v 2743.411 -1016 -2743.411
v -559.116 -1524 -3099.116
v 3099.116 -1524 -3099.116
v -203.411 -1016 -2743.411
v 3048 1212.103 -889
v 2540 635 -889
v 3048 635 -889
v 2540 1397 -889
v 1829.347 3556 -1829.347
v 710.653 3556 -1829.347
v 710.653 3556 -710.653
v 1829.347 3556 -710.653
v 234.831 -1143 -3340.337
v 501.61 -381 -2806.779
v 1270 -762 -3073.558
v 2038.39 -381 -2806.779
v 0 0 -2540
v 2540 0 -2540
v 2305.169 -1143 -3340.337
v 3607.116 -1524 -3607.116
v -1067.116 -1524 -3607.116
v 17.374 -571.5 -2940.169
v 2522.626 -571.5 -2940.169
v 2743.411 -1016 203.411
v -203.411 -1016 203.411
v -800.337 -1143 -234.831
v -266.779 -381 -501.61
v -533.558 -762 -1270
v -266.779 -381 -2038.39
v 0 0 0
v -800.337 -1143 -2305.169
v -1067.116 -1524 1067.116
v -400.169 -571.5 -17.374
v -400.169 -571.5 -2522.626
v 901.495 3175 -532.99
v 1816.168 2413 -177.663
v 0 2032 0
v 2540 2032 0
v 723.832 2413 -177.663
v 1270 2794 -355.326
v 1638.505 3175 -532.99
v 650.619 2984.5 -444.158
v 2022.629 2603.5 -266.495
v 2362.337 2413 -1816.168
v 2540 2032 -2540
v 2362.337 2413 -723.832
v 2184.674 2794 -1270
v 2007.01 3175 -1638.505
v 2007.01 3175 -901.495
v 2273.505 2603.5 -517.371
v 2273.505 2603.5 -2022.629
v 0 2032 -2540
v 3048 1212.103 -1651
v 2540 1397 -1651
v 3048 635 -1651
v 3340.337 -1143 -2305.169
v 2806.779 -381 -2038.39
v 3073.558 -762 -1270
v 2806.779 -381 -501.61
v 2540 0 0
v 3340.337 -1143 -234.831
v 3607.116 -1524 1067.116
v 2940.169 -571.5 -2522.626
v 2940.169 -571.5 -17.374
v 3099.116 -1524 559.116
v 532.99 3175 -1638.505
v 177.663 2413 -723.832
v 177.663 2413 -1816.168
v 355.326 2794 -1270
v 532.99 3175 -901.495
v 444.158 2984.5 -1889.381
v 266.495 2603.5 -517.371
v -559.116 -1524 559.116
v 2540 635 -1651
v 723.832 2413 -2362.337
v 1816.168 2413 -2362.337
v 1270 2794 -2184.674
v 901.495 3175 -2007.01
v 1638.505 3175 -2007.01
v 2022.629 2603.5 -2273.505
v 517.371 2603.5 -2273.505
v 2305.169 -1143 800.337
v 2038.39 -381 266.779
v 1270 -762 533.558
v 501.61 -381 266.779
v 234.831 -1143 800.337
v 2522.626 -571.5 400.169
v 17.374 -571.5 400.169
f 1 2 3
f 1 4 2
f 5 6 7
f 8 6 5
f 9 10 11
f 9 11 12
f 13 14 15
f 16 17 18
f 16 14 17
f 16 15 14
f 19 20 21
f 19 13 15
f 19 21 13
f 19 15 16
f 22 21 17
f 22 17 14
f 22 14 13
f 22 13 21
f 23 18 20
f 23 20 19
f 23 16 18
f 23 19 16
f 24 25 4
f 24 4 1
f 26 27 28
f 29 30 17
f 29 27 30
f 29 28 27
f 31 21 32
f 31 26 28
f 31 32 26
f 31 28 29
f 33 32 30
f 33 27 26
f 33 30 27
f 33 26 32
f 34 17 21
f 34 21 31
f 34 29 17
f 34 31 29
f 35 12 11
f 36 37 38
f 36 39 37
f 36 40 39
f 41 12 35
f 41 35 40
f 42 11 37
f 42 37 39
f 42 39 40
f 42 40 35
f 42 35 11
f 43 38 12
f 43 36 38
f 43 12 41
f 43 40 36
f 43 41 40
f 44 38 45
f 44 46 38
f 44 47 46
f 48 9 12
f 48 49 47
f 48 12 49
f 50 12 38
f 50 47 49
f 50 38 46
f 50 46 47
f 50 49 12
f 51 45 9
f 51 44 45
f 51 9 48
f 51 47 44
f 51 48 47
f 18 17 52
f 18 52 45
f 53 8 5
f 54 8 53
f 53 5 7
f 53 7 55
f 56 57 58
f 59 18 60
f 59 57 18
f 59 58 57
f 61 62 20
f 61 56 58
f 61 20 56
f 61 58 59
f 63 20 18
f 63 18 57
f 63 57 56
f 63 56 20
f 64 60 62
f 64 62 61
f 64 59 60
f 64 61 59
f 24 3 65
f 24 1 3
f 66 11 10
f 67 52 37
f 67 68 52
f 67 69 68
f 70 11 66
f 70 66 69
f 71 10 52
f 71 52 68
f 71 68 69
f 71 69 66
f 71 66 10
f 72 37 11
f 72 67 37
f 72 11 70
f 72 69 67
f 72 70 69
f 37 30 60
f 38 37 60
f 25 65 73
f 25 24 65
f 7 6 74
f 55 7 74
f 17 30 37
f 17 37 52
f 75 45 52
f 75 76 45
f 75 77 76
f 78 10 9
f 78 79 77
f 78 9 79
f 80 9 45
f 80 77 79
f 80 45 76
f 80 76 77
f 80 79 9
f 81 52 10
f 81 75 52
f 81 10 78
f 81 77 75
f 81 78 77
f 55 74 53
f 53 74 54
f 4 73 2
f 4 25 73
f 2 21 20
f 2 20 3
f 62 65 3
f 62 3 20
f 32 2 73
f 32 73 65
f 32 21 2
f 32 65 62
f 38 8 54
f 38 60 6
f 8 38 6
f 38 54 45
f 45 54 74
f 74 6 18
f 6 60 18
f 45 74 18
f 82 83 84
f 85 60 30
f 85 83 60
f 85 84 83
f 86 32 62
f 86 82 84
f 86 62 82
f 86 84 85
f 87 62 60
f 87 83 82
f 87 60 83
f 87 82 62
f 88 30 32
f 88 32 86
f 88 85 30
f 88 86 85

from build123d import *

# Parameters (mm, degrees)
SKETCH1_W           = 2540
SKETCH1_H           = 2540
BOSS_EXTRUDE1_DEPTH = 2032
SKETCH3_W           = 2540
SKETCH3_H           = 2540
BOSS_EXTRUDE2_DEPTH = 1524
BOSS_EXTRUDE2_TAPER = 25
SKETCH6_W           = 2540
SKETCH6_H           = 2540
BOSS_EXTRUDE3_DEPTH = 1524
BOSS_EXTRUDE3_TAPER = -35
SKETCH7_W           = 3658.232576464
SKETCH7_H           = 3658.232576464
CUT_EXTRUDE1_DEPTH  = 508
CUT_EXTRUDE1_TAPER  = 35
SKETCH8_W           = 762
SKETCH8_H           = 762
BOSS_EXTRUDE4_DEPTH = 508
DRAFT1_ANGLE        = 20


with BuildPart() as part:
    # Sketch1 → Boss-Extrude1 (new body)
    with BuildSketch(Plane(origin=(0, 0, 0), x_dir=(1, 0, 0), z_dir=(0, 1, 0))):
        with Locations((1270, 1270)):
            Rectangle(SKETCH1_W, SKETCH1_H)
    extrude(amount=BOSS_EXTRUDE1_DEPTH)

    # Sketch3 → Boss-Extrude2 (add)
    with BuildSketch(Plane(origin=(0, 2032, 0), x_dir=(1, 0, 0), z_dir=(0, 1, 0))):
        with Locations((1270, 1270)):
            Rectangle(SKETCH3_W, SKETCH3_H)
    extrude(amount=BOSS_EXTRUDE2_DEPTH, taper=BOSS_EXTRUDE2_TAPER)

    # Sketch6 → Boss-Extrude3 (add)
    with BuildSketch(Plane.XZ):
        with Locations((1270, -1270)):
            Rectangle(SKETCH6_W, SKETCH6_H)
    extrude(amount=BOSS_EXTRUDE3_DEPTH, taper=BOSS_EXTRUDE3_TAPER)

    # Sketch7 → Cut-Extrude1 (cut)
    with BuildSketch(Plane.XZ.offset(1524)):
        with Locations((1270, -1270)):
            Rectangle(SKETCH7_W, SKETCH7_H)
    extrude(amount=-CUT_EXTRUDE1_DEPTH, taper=CUT_EXTRUDE1_TAPER, mode=Mode.SUBTRACT)

    # Sketch8 → Boss-Extrude4 (add)
    with BuildSketch(Plane(origin=(2540, 0, 0), x_dir=(0, 0, -1), z_dir=(1, 0, 0))):
        with Locations((1270, 1016)):
            Rectangle(SKETCH8_W, SKETCH8_H)
    extrude(amount=BOSS_EXTRUDE4_DEPTH)

    # Draft1
    draft1_faces = [part.faces().sort_by_distance(p)[0] for p in [
        (2794, 1397, -1270),
    ]]
    draft(draft1_faces, Plane(origin=(2540, 2032, 0), x_dir=(0, 0, 1), z_dir=(1, 0, 0)), DRAFT1_ANGLE)


solid = part.part
